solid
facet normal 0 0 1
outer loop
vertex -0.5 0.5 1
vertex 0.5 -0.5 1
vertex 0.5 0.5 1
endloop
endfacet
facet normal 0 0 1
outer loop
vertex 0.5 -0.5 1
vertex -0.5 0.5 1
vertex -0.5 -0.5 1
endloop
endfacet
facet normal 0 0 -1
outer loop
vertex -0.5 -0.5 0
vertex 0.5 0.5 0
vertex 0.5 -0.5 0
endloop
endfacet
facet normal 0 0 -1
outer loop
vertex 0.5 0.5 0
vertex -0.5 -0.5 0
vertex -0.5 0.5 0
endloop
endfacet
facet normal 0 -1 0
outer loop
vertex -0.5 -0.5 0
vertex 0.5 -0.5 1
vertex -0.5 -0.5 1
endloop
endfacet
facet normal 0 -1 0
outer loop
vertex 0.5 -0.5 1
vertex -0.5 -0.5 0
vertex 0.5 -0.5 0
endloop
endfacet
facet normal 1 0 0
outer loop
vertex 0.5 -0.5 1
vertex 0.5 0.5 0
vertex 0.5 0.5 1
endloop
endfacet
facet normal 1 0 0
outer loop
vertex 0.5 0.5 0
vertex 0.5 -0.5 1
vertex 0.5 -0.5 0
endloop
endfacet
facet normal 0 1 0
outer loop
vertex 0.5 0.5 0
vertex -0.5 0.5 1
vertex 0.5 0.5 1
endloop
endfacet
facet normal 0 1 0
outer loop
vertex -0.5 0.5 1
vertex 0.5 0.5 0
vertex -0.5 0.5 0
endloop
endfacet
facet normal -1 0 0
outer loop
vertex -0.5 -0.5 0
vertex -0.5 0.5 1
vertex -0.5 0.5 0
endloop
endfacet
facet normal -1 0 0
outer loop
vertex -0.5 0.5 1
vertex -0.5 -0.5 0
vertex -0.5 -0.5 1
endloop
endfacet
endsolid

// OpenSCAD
// Cube for Basic Shapes
// by Slashee the Cow

translate([0,0,0.5])
    cube(1, center = true);
